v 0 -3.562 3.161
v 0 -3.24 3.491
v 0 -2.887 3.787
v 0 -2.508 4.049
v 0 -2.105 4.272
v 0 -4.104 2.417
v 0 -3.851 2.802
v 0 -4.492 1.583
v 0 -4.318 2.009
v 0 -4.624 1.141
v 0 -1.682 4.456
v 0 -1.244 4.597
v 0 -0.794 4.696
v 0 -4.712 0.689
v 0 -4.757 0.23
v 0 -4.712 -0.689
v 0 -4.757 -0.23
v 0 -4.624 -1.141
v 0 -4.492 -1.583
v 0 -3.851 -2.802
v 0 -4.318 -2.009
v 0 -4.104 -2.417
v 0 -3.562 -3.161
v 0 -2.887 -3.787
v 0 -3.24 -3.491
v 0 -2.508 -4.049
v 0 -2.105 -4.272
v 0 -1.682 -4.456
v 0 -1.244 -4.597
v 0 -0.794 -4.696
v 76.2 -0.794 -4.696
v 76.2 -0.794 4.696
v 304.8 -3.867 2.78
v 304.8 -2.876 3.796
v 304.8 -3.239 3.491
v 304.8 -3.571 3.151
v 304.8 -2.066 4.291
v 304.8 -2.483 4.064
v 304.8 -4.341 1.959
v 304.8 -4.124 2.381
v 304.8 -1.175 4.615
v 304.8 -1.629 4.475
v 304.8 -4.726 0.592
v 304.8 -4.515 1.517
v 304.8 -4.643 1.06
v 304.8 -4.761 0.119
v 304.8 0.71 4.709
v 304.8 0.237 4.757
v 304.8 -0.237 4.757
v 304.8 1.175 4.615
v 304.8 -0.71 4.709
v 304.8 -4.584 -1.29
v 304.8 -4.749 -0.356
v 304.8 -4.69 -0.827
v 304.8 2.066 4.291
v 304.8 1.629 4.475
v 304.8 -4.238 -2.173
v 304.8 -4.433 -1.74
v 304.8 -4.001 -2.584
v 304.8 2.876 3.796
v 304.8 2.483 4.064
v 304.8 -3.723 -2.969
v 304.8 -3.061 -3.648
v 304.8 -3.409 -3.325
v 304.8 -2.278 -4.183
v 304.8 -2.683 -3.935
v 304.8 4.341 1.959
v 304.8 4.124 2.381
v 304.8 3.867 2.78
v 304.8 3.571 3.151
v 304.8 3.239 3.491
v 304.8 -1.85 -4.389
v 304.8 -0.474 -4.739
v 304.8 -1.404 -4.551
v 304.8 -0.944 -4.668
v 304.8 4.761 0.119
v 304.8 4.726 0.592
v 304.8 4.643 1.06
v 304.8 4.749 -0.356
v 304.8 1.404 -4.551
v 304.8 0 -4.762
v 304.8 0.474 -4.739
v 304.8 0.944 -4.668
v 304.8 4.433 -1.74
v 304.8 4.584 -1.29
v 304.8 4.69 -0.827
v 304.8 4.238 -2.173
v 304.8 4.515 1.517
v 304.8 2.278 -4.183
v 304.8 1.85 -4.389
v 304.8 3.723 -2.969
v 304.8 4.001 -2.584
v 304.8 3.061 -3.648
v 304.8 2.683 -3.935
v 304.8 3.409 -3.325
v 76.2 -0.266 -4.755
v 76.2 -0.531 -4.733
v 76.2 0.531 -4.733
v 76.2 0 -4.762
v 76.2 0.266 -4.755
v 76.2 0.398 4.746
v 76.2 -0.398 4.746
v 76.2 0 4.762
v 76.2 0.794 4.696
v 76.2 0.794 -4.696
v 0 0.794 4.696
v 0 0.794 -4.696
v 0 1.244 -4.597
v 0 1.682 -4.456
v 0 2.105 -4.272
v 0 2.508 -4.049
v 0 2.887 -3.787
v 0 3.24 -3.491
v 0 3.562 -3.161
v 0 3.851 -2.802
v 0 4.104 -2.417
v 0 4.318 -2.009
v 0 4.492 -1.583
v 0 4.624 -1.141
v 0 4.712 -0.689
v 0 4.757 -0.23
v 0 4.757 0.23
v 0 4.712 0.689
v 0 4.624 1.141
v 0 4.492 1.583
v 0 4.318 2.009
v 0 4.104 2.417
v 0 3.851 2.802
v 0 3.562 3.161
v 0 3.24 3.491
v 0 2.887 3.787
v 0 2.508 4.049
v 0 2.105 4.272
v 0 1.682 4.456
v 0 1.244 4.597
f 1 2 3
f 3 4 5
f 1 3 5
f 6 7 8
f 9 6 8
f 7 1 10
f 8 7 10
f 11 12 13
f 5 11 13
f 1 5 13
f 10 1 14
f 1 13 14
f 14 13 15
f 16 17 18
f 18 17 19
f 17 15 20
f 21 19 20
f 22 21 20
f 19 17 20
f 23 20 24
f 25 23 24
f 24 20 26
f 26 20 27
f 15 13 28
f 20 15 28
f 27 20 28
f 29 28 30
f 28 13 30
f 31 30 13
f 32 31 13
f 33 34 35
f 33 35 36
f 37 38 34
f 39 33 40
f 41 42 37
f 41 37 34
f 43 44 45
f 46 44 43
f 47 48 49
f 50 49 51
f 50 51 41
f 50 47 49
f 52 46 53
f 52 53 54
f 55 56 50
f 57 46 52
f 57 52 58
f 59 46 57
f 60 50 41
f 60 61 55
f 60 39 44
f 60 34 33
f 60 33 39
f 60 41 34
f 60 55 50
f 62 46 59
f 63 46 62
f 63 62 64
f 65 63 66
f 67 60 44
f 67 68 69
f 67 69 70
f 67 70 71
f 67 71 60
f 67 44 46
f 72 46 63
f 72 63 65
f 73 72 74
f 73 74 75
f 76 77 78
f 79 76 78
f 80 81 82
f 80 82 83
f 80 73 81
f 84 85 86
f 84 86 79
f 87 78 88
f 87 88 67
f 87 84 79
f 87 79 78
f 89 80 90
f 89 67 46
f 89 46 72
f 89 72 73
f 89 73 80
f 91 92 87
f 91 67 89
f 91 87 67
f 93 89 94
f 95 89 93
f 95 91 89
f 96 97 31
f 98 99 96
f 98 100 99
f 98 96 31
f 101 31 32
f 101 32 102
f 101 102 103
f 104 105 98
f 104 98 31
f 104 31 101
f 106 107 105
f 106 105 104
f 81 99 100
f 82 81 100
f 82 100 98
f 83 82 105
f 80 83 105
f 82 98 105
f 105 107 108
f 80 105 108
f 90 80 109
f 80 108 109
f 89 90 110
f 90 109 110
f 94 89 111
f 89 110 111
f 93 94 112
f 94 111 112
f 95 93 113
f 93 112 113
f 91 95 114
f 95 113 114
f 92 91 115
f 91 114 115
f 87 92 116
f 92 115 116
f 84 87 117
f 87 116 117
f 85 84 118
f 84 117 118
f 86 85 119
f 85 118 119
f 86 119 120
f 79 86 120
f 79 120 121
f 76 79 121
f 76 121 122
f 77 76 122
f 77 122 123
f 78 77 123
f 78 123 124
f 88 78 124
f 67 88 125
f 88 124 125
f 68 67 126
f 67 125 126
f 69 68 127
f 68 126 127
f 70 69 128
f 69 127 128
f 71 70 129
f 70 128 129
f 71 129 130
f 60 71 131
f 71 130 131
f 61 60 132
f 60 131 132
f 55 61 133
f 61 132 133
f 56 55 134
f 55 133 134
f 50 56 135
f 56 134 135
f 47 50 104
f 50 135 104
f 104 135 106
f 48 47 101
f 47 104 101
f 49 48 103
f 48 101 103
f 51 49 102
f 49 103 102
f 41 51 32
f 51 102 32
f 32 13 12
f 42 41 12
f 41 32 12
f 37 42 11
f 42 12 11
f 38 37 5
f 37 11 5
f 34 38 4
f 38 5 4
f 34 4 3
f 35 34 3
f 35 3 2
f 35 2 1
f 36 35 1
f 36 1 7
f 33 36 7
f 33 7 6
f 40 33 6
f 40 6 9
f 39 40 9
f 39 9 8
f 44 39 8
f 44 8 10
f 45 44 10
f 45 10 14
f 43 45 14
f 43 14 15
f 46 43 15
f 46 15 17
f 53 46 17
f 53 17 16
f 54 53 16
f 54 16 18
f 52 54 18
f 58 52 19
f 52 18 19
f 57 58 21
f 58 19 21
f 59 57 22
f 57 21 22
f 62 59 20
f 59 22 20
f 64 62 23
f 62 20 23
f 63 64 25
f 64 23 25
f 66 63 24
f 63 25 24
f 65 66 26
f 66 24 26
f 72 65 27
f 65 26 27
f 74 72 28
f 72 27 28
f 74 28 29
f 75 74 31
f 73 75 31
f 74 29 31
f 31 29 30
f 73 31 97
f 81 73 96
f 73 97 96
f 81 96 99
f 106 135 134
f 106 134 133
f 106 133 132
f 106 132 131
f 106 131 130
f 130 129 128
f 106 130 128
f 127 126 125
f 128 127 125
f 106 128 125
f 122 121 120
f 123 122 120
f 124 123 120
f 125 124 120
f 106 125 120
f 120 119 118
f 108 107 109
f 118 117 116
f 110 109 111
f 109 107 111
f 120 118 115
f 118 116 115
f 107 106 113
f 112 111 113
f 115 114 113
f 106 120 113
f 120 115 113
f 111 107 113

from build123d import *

# Parameters (mm, degrees)
SKETCH1_R           = 4.7625
BOSS_EXTRUDE1_DEPTH = 304.8
SKETCH2_W           = 12.7
SKETCH2_H           = 1.5875
CUT_EXTRUDE1_DEPTH  = 76.2


with BuildPart() as part:
    # Sketch1 → Boss-Extrude1 (new body)
    with BuildSketch(Plane(origin=(0, 0, 0), x_dir=(0, 0, -1), z_dir=(1, 0, 0))):
        Circle(SKETCH1_R)
    extrude(amount=BOSS_EXTRUDE1_DEPTH)

    # Sketch2 → Cut-Extrude1 (cut)
    with BuildSketch(Plane.ZY):
        Rectangle(SKETCH2_W, SKETCH2_H)
    extrude(amount=-CUT_EXTRUDE1_DEPTH, mode=Mode.SUBTRACT)


solid = part.part
